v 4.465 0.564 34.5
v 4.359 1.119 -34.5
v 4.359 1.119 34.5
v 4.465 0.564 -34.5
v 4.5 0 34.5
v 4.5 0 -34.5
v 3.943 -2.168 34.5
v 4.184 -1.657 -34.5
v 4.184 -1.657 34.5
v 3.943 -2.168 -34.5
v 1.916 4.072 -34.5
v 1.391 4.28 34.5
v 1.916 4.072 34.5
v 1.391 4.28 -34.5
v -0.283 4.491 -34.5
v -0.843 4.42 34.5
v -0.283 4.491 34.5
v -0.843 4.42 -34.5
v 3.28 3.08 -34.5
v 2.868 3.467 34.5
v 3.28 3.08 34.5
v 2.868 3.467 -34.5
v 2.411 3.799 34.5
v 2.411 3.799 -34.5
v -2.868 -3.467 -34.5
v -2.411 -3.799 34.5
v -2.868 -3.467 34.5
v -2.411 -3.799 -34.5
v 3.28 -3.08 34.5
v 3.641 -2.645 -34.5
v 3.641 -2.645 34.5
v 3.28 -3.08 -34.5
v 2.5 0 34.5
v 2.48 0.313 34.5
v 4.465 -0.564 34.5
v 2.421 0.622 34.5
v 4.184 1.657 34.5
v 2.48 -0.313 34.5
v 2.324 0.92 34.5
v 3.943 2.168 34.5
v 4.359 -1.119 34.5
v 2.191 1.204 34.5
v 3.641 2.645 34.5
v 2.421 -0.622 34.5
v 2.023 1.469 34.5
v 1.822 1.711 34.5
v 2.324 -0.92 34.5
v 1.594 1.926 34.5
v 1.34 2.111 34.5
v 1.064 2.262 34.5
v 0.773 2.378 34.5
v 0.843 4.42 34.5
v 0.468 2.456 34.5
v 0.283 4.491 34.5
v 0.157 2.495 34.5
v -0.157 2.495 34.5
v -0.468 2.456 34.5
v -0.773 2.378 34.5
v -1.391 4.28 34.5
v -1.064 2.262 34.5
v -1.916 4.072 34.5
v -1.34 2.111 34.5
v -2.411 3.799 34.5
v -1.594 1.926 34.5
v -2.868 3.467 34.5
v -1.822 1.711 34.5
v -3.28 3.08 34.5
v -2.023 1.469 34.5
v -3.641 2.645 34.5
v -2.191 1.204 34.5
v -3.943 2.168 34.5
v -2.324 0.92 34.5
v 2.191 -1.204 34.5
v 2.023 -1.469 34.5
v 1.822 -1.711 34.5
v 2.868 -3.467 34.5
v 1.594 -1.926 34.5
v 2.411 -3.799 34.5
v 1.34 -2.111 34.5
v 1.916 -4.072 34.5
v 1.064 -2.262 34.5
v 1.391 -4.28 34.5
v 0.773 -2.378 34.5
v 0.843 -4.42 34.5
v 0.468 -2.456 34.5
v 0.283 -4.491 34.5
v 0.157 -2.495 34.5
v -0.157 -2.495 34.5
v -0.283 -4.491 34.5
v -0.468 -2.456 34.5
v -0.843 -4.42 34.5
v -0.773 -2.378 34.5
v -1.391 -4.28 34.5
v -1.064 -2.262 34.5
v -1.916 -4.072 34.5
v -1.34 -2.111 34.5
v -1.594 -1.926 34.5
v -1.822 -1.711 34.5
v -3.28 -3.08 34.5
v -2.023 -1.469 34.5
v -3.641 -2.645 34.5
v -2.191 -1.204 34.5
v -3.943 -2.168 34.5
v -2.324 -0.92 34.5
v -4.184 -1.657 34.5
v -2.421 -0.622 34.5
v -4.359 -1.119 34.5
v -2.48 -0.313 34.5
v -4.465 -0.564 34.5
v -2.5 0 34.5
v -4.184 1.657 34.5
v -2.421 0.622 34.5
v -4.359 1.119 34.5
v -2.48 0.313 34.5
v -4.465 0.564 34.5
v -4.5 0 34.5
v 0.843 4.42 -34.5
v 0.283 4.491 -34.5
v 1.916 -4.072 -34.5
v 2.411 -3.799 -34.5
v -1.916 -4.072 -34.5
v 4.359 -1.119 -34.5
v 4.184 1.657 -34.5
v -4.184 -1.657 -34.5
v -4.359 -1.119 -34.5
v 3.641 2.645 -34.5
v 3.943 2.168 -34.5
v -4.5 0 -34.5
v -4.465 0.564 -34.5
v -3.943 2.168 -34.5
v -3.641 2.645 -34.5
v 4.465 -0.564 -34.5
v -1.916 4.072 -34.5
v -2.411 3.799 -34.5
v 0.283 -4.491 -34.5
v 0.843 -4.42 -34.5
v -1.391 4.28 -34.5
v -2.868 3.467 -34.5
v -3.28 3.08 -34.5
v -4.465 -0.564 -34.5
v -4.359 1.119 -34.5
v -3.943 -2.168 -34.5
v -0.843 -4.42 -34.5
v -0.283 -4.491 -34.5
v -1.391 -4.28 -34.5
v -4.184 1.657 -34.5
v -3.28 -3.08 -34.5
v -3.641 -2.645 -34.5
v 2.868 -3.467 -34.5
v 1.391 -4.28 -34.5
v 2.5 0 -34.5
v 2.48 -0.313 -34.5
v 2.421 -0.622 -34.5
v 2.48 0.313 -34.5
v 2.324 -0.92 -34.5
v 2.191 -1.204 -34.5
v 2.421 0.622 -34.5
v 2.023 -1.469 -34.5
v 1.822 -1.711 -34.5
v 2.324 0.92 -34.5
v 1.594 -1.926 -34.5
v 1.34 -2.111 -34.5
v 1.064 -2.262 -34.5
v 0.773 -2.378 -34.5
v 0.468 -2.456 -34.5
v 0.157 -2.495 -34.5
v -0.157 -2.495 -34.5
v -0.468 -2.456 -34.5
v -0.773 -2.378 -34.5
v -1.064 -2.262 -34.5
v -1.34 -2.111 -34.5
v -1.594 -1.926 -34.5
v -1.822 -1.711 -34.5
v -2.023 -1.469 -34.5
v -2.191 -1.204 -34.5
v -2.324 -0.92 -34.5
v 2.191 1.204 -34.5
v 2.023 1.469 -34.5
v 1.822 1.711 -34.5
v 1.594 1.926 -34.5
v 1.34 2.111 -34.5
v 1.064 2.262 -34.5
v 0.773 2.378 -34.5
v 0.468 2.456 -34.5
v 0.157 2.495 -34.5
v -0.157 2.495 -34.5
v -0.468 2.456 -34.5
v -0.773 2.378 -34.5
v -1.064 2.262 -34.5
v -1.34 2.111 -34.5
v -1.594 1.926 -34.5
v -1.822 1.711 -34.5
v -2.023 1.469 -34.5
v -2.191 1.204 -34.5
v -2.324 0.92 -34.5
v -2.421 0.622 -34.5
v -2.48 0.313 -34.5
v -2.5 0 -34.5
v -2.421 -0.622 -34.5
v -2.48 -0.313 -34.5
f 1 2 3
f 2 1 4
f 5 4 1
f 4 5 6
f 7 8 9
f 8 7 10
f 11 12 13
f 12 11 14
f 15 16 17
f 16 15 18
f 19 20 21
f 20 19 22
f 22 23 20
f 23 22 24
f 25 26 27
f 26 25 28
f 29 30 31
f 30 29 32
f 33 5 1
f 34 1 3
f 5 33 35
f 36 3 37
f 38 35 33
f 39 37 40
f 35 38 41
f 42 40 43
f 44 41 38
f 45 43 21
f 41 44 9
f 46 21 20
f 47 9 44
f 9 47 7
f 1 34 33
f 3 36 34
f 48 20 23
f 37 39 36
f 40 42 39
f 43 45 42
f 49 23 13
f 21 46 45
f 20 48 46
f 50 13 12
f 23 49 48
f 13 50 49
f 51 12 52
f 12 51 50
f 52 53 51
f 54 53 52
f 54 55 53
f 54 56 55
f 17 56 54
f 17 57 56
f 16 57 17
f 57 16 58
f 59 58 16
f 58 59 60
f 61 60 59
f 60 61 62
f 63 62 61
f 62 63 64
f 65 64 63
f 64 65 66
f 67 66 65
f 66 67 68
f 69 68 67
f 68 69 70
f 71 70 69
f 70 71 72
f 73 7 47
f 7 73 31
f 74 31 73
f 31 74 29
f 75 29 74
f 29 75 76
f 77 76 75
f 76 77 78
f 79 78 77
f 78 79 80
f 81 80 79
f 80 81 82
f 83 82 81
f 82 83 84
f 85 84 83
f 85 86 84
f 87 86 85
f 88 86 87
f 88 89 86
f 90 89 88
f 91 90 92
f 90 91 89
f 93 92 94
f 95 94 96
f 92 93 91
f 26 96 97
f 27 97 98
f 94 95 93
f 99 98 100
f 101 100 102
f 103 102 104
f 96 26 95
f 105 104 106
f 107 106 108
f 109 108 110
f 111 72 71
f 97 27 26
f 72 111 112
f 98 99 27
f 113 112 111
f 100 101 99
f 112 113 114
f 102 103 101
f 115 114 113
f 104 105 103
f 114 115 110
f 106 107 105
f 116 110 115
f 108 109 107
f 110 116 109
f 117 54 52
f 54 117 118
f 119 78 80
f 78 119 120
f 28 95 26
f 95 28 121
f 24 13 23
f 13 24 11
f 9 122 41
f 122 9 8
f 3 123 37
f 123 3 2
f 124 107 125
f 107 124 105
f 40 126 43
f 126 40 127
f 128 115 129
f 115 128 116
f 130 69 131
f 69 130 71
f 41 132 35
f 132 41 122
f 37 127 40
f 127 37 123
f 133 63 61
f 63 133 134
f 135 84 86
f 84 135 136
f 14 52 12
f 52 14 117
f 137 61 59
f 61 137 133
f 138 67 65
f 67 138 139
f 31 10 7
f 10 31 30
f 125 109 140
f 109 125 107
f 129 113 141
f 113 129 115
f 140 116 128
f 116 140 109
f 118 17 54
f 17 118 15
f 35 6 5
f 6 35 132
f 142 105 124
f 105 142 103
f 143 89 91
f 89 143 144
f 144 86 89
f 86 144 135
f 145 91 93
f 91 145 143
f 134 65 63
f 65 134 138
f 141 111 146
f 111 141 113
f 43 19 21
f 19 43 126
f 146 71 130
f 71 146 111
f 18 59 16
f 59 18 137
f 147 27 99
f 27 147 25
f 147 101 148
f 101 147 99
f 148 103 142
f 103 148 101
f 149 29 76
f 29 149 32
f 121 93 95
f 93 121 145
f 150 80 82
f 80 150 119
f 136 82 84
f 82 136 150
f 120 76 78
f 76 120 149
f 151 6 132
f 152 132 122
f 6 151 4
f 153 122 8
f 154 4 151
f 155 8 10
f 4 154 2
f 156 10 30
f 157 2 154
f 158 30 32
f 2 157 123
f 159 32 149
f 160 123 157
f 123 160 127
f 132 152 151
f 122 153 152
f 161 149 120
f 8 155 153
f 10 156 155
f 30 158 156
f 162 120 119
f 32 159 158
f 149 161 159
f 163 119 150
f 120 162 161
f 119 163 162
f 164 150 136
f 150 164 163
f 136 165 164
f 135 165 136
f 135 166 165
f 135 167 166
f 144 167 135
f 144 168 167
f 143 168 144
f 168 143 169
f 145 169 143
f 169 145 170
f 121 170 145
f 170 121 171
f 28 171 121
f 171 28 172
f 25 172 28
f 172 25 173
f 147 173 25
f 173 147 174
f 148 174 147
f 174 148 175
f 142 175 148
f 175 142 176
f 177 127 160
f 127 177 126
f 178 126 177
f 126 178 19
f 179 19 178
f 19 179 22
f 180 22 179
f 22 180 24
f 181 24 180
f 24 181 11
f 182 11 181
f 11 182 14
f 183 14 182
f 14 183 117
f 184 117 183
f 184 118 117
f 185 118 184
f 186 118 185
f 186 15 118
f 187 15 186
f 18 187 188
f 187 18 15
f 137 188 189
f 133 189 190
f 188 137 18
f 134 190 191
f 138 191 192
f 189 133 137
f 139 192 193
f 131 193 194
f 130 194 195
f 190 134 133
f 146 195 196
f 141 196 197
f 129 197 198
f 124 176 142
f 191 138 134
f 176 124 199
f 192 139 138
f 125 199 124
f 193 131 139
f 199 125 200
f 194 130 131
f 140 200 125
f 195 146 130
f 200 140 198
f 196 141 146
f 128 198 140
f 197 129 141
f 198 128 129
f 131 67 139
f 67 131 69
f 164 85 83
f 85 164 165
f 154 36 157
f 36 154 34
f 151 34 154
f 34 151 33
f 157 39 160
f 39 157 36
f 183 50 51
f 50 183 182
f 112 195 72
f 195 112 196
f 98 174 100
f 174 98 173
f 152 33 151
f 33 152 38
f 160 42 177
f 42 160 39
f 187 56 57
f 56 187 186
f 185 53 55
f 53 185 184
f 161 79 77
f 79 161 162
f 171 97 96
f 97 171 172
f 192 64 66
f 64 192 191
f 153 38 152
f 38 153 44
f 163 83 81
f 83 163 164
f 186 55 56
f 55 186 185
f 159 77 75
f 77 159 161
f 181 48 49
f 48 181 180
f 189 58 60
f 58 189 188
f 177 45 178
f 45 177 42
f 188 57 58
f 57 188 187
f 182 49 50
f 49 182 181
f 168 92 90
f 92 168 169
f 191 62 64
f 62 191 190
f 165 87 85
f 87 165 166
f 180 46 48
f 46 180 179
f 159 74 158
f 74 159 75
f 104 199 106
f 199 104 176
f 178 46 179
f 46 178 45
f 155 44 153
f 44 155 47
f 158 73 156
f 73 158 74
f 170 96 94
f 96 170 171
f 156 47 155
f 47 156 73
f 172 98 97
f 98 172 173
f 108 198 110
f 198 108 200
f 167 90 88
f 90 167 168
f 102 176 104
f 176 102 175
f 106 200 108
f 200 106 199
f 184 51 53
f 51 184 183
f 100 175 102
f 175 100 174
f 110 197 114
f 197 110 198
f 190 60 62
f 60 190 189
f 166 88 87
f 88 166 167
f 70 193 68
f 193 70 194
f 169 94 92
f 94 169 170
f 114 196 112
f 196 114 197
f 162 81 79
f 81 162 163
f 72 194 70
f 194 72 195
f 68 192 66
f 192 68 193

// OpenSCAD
$fn = 50;


difference() {
	union() {
		translate(v = [0, 0, -34.5000000000]) {
			cylinder(h = 69, r = 4.5000000000);
		}
	}
	union() {
		translate(v = [0, 0, -100.0000000000]) {
			cylinder(h = 200, r = 2.5000000000);
		}
	}
}
